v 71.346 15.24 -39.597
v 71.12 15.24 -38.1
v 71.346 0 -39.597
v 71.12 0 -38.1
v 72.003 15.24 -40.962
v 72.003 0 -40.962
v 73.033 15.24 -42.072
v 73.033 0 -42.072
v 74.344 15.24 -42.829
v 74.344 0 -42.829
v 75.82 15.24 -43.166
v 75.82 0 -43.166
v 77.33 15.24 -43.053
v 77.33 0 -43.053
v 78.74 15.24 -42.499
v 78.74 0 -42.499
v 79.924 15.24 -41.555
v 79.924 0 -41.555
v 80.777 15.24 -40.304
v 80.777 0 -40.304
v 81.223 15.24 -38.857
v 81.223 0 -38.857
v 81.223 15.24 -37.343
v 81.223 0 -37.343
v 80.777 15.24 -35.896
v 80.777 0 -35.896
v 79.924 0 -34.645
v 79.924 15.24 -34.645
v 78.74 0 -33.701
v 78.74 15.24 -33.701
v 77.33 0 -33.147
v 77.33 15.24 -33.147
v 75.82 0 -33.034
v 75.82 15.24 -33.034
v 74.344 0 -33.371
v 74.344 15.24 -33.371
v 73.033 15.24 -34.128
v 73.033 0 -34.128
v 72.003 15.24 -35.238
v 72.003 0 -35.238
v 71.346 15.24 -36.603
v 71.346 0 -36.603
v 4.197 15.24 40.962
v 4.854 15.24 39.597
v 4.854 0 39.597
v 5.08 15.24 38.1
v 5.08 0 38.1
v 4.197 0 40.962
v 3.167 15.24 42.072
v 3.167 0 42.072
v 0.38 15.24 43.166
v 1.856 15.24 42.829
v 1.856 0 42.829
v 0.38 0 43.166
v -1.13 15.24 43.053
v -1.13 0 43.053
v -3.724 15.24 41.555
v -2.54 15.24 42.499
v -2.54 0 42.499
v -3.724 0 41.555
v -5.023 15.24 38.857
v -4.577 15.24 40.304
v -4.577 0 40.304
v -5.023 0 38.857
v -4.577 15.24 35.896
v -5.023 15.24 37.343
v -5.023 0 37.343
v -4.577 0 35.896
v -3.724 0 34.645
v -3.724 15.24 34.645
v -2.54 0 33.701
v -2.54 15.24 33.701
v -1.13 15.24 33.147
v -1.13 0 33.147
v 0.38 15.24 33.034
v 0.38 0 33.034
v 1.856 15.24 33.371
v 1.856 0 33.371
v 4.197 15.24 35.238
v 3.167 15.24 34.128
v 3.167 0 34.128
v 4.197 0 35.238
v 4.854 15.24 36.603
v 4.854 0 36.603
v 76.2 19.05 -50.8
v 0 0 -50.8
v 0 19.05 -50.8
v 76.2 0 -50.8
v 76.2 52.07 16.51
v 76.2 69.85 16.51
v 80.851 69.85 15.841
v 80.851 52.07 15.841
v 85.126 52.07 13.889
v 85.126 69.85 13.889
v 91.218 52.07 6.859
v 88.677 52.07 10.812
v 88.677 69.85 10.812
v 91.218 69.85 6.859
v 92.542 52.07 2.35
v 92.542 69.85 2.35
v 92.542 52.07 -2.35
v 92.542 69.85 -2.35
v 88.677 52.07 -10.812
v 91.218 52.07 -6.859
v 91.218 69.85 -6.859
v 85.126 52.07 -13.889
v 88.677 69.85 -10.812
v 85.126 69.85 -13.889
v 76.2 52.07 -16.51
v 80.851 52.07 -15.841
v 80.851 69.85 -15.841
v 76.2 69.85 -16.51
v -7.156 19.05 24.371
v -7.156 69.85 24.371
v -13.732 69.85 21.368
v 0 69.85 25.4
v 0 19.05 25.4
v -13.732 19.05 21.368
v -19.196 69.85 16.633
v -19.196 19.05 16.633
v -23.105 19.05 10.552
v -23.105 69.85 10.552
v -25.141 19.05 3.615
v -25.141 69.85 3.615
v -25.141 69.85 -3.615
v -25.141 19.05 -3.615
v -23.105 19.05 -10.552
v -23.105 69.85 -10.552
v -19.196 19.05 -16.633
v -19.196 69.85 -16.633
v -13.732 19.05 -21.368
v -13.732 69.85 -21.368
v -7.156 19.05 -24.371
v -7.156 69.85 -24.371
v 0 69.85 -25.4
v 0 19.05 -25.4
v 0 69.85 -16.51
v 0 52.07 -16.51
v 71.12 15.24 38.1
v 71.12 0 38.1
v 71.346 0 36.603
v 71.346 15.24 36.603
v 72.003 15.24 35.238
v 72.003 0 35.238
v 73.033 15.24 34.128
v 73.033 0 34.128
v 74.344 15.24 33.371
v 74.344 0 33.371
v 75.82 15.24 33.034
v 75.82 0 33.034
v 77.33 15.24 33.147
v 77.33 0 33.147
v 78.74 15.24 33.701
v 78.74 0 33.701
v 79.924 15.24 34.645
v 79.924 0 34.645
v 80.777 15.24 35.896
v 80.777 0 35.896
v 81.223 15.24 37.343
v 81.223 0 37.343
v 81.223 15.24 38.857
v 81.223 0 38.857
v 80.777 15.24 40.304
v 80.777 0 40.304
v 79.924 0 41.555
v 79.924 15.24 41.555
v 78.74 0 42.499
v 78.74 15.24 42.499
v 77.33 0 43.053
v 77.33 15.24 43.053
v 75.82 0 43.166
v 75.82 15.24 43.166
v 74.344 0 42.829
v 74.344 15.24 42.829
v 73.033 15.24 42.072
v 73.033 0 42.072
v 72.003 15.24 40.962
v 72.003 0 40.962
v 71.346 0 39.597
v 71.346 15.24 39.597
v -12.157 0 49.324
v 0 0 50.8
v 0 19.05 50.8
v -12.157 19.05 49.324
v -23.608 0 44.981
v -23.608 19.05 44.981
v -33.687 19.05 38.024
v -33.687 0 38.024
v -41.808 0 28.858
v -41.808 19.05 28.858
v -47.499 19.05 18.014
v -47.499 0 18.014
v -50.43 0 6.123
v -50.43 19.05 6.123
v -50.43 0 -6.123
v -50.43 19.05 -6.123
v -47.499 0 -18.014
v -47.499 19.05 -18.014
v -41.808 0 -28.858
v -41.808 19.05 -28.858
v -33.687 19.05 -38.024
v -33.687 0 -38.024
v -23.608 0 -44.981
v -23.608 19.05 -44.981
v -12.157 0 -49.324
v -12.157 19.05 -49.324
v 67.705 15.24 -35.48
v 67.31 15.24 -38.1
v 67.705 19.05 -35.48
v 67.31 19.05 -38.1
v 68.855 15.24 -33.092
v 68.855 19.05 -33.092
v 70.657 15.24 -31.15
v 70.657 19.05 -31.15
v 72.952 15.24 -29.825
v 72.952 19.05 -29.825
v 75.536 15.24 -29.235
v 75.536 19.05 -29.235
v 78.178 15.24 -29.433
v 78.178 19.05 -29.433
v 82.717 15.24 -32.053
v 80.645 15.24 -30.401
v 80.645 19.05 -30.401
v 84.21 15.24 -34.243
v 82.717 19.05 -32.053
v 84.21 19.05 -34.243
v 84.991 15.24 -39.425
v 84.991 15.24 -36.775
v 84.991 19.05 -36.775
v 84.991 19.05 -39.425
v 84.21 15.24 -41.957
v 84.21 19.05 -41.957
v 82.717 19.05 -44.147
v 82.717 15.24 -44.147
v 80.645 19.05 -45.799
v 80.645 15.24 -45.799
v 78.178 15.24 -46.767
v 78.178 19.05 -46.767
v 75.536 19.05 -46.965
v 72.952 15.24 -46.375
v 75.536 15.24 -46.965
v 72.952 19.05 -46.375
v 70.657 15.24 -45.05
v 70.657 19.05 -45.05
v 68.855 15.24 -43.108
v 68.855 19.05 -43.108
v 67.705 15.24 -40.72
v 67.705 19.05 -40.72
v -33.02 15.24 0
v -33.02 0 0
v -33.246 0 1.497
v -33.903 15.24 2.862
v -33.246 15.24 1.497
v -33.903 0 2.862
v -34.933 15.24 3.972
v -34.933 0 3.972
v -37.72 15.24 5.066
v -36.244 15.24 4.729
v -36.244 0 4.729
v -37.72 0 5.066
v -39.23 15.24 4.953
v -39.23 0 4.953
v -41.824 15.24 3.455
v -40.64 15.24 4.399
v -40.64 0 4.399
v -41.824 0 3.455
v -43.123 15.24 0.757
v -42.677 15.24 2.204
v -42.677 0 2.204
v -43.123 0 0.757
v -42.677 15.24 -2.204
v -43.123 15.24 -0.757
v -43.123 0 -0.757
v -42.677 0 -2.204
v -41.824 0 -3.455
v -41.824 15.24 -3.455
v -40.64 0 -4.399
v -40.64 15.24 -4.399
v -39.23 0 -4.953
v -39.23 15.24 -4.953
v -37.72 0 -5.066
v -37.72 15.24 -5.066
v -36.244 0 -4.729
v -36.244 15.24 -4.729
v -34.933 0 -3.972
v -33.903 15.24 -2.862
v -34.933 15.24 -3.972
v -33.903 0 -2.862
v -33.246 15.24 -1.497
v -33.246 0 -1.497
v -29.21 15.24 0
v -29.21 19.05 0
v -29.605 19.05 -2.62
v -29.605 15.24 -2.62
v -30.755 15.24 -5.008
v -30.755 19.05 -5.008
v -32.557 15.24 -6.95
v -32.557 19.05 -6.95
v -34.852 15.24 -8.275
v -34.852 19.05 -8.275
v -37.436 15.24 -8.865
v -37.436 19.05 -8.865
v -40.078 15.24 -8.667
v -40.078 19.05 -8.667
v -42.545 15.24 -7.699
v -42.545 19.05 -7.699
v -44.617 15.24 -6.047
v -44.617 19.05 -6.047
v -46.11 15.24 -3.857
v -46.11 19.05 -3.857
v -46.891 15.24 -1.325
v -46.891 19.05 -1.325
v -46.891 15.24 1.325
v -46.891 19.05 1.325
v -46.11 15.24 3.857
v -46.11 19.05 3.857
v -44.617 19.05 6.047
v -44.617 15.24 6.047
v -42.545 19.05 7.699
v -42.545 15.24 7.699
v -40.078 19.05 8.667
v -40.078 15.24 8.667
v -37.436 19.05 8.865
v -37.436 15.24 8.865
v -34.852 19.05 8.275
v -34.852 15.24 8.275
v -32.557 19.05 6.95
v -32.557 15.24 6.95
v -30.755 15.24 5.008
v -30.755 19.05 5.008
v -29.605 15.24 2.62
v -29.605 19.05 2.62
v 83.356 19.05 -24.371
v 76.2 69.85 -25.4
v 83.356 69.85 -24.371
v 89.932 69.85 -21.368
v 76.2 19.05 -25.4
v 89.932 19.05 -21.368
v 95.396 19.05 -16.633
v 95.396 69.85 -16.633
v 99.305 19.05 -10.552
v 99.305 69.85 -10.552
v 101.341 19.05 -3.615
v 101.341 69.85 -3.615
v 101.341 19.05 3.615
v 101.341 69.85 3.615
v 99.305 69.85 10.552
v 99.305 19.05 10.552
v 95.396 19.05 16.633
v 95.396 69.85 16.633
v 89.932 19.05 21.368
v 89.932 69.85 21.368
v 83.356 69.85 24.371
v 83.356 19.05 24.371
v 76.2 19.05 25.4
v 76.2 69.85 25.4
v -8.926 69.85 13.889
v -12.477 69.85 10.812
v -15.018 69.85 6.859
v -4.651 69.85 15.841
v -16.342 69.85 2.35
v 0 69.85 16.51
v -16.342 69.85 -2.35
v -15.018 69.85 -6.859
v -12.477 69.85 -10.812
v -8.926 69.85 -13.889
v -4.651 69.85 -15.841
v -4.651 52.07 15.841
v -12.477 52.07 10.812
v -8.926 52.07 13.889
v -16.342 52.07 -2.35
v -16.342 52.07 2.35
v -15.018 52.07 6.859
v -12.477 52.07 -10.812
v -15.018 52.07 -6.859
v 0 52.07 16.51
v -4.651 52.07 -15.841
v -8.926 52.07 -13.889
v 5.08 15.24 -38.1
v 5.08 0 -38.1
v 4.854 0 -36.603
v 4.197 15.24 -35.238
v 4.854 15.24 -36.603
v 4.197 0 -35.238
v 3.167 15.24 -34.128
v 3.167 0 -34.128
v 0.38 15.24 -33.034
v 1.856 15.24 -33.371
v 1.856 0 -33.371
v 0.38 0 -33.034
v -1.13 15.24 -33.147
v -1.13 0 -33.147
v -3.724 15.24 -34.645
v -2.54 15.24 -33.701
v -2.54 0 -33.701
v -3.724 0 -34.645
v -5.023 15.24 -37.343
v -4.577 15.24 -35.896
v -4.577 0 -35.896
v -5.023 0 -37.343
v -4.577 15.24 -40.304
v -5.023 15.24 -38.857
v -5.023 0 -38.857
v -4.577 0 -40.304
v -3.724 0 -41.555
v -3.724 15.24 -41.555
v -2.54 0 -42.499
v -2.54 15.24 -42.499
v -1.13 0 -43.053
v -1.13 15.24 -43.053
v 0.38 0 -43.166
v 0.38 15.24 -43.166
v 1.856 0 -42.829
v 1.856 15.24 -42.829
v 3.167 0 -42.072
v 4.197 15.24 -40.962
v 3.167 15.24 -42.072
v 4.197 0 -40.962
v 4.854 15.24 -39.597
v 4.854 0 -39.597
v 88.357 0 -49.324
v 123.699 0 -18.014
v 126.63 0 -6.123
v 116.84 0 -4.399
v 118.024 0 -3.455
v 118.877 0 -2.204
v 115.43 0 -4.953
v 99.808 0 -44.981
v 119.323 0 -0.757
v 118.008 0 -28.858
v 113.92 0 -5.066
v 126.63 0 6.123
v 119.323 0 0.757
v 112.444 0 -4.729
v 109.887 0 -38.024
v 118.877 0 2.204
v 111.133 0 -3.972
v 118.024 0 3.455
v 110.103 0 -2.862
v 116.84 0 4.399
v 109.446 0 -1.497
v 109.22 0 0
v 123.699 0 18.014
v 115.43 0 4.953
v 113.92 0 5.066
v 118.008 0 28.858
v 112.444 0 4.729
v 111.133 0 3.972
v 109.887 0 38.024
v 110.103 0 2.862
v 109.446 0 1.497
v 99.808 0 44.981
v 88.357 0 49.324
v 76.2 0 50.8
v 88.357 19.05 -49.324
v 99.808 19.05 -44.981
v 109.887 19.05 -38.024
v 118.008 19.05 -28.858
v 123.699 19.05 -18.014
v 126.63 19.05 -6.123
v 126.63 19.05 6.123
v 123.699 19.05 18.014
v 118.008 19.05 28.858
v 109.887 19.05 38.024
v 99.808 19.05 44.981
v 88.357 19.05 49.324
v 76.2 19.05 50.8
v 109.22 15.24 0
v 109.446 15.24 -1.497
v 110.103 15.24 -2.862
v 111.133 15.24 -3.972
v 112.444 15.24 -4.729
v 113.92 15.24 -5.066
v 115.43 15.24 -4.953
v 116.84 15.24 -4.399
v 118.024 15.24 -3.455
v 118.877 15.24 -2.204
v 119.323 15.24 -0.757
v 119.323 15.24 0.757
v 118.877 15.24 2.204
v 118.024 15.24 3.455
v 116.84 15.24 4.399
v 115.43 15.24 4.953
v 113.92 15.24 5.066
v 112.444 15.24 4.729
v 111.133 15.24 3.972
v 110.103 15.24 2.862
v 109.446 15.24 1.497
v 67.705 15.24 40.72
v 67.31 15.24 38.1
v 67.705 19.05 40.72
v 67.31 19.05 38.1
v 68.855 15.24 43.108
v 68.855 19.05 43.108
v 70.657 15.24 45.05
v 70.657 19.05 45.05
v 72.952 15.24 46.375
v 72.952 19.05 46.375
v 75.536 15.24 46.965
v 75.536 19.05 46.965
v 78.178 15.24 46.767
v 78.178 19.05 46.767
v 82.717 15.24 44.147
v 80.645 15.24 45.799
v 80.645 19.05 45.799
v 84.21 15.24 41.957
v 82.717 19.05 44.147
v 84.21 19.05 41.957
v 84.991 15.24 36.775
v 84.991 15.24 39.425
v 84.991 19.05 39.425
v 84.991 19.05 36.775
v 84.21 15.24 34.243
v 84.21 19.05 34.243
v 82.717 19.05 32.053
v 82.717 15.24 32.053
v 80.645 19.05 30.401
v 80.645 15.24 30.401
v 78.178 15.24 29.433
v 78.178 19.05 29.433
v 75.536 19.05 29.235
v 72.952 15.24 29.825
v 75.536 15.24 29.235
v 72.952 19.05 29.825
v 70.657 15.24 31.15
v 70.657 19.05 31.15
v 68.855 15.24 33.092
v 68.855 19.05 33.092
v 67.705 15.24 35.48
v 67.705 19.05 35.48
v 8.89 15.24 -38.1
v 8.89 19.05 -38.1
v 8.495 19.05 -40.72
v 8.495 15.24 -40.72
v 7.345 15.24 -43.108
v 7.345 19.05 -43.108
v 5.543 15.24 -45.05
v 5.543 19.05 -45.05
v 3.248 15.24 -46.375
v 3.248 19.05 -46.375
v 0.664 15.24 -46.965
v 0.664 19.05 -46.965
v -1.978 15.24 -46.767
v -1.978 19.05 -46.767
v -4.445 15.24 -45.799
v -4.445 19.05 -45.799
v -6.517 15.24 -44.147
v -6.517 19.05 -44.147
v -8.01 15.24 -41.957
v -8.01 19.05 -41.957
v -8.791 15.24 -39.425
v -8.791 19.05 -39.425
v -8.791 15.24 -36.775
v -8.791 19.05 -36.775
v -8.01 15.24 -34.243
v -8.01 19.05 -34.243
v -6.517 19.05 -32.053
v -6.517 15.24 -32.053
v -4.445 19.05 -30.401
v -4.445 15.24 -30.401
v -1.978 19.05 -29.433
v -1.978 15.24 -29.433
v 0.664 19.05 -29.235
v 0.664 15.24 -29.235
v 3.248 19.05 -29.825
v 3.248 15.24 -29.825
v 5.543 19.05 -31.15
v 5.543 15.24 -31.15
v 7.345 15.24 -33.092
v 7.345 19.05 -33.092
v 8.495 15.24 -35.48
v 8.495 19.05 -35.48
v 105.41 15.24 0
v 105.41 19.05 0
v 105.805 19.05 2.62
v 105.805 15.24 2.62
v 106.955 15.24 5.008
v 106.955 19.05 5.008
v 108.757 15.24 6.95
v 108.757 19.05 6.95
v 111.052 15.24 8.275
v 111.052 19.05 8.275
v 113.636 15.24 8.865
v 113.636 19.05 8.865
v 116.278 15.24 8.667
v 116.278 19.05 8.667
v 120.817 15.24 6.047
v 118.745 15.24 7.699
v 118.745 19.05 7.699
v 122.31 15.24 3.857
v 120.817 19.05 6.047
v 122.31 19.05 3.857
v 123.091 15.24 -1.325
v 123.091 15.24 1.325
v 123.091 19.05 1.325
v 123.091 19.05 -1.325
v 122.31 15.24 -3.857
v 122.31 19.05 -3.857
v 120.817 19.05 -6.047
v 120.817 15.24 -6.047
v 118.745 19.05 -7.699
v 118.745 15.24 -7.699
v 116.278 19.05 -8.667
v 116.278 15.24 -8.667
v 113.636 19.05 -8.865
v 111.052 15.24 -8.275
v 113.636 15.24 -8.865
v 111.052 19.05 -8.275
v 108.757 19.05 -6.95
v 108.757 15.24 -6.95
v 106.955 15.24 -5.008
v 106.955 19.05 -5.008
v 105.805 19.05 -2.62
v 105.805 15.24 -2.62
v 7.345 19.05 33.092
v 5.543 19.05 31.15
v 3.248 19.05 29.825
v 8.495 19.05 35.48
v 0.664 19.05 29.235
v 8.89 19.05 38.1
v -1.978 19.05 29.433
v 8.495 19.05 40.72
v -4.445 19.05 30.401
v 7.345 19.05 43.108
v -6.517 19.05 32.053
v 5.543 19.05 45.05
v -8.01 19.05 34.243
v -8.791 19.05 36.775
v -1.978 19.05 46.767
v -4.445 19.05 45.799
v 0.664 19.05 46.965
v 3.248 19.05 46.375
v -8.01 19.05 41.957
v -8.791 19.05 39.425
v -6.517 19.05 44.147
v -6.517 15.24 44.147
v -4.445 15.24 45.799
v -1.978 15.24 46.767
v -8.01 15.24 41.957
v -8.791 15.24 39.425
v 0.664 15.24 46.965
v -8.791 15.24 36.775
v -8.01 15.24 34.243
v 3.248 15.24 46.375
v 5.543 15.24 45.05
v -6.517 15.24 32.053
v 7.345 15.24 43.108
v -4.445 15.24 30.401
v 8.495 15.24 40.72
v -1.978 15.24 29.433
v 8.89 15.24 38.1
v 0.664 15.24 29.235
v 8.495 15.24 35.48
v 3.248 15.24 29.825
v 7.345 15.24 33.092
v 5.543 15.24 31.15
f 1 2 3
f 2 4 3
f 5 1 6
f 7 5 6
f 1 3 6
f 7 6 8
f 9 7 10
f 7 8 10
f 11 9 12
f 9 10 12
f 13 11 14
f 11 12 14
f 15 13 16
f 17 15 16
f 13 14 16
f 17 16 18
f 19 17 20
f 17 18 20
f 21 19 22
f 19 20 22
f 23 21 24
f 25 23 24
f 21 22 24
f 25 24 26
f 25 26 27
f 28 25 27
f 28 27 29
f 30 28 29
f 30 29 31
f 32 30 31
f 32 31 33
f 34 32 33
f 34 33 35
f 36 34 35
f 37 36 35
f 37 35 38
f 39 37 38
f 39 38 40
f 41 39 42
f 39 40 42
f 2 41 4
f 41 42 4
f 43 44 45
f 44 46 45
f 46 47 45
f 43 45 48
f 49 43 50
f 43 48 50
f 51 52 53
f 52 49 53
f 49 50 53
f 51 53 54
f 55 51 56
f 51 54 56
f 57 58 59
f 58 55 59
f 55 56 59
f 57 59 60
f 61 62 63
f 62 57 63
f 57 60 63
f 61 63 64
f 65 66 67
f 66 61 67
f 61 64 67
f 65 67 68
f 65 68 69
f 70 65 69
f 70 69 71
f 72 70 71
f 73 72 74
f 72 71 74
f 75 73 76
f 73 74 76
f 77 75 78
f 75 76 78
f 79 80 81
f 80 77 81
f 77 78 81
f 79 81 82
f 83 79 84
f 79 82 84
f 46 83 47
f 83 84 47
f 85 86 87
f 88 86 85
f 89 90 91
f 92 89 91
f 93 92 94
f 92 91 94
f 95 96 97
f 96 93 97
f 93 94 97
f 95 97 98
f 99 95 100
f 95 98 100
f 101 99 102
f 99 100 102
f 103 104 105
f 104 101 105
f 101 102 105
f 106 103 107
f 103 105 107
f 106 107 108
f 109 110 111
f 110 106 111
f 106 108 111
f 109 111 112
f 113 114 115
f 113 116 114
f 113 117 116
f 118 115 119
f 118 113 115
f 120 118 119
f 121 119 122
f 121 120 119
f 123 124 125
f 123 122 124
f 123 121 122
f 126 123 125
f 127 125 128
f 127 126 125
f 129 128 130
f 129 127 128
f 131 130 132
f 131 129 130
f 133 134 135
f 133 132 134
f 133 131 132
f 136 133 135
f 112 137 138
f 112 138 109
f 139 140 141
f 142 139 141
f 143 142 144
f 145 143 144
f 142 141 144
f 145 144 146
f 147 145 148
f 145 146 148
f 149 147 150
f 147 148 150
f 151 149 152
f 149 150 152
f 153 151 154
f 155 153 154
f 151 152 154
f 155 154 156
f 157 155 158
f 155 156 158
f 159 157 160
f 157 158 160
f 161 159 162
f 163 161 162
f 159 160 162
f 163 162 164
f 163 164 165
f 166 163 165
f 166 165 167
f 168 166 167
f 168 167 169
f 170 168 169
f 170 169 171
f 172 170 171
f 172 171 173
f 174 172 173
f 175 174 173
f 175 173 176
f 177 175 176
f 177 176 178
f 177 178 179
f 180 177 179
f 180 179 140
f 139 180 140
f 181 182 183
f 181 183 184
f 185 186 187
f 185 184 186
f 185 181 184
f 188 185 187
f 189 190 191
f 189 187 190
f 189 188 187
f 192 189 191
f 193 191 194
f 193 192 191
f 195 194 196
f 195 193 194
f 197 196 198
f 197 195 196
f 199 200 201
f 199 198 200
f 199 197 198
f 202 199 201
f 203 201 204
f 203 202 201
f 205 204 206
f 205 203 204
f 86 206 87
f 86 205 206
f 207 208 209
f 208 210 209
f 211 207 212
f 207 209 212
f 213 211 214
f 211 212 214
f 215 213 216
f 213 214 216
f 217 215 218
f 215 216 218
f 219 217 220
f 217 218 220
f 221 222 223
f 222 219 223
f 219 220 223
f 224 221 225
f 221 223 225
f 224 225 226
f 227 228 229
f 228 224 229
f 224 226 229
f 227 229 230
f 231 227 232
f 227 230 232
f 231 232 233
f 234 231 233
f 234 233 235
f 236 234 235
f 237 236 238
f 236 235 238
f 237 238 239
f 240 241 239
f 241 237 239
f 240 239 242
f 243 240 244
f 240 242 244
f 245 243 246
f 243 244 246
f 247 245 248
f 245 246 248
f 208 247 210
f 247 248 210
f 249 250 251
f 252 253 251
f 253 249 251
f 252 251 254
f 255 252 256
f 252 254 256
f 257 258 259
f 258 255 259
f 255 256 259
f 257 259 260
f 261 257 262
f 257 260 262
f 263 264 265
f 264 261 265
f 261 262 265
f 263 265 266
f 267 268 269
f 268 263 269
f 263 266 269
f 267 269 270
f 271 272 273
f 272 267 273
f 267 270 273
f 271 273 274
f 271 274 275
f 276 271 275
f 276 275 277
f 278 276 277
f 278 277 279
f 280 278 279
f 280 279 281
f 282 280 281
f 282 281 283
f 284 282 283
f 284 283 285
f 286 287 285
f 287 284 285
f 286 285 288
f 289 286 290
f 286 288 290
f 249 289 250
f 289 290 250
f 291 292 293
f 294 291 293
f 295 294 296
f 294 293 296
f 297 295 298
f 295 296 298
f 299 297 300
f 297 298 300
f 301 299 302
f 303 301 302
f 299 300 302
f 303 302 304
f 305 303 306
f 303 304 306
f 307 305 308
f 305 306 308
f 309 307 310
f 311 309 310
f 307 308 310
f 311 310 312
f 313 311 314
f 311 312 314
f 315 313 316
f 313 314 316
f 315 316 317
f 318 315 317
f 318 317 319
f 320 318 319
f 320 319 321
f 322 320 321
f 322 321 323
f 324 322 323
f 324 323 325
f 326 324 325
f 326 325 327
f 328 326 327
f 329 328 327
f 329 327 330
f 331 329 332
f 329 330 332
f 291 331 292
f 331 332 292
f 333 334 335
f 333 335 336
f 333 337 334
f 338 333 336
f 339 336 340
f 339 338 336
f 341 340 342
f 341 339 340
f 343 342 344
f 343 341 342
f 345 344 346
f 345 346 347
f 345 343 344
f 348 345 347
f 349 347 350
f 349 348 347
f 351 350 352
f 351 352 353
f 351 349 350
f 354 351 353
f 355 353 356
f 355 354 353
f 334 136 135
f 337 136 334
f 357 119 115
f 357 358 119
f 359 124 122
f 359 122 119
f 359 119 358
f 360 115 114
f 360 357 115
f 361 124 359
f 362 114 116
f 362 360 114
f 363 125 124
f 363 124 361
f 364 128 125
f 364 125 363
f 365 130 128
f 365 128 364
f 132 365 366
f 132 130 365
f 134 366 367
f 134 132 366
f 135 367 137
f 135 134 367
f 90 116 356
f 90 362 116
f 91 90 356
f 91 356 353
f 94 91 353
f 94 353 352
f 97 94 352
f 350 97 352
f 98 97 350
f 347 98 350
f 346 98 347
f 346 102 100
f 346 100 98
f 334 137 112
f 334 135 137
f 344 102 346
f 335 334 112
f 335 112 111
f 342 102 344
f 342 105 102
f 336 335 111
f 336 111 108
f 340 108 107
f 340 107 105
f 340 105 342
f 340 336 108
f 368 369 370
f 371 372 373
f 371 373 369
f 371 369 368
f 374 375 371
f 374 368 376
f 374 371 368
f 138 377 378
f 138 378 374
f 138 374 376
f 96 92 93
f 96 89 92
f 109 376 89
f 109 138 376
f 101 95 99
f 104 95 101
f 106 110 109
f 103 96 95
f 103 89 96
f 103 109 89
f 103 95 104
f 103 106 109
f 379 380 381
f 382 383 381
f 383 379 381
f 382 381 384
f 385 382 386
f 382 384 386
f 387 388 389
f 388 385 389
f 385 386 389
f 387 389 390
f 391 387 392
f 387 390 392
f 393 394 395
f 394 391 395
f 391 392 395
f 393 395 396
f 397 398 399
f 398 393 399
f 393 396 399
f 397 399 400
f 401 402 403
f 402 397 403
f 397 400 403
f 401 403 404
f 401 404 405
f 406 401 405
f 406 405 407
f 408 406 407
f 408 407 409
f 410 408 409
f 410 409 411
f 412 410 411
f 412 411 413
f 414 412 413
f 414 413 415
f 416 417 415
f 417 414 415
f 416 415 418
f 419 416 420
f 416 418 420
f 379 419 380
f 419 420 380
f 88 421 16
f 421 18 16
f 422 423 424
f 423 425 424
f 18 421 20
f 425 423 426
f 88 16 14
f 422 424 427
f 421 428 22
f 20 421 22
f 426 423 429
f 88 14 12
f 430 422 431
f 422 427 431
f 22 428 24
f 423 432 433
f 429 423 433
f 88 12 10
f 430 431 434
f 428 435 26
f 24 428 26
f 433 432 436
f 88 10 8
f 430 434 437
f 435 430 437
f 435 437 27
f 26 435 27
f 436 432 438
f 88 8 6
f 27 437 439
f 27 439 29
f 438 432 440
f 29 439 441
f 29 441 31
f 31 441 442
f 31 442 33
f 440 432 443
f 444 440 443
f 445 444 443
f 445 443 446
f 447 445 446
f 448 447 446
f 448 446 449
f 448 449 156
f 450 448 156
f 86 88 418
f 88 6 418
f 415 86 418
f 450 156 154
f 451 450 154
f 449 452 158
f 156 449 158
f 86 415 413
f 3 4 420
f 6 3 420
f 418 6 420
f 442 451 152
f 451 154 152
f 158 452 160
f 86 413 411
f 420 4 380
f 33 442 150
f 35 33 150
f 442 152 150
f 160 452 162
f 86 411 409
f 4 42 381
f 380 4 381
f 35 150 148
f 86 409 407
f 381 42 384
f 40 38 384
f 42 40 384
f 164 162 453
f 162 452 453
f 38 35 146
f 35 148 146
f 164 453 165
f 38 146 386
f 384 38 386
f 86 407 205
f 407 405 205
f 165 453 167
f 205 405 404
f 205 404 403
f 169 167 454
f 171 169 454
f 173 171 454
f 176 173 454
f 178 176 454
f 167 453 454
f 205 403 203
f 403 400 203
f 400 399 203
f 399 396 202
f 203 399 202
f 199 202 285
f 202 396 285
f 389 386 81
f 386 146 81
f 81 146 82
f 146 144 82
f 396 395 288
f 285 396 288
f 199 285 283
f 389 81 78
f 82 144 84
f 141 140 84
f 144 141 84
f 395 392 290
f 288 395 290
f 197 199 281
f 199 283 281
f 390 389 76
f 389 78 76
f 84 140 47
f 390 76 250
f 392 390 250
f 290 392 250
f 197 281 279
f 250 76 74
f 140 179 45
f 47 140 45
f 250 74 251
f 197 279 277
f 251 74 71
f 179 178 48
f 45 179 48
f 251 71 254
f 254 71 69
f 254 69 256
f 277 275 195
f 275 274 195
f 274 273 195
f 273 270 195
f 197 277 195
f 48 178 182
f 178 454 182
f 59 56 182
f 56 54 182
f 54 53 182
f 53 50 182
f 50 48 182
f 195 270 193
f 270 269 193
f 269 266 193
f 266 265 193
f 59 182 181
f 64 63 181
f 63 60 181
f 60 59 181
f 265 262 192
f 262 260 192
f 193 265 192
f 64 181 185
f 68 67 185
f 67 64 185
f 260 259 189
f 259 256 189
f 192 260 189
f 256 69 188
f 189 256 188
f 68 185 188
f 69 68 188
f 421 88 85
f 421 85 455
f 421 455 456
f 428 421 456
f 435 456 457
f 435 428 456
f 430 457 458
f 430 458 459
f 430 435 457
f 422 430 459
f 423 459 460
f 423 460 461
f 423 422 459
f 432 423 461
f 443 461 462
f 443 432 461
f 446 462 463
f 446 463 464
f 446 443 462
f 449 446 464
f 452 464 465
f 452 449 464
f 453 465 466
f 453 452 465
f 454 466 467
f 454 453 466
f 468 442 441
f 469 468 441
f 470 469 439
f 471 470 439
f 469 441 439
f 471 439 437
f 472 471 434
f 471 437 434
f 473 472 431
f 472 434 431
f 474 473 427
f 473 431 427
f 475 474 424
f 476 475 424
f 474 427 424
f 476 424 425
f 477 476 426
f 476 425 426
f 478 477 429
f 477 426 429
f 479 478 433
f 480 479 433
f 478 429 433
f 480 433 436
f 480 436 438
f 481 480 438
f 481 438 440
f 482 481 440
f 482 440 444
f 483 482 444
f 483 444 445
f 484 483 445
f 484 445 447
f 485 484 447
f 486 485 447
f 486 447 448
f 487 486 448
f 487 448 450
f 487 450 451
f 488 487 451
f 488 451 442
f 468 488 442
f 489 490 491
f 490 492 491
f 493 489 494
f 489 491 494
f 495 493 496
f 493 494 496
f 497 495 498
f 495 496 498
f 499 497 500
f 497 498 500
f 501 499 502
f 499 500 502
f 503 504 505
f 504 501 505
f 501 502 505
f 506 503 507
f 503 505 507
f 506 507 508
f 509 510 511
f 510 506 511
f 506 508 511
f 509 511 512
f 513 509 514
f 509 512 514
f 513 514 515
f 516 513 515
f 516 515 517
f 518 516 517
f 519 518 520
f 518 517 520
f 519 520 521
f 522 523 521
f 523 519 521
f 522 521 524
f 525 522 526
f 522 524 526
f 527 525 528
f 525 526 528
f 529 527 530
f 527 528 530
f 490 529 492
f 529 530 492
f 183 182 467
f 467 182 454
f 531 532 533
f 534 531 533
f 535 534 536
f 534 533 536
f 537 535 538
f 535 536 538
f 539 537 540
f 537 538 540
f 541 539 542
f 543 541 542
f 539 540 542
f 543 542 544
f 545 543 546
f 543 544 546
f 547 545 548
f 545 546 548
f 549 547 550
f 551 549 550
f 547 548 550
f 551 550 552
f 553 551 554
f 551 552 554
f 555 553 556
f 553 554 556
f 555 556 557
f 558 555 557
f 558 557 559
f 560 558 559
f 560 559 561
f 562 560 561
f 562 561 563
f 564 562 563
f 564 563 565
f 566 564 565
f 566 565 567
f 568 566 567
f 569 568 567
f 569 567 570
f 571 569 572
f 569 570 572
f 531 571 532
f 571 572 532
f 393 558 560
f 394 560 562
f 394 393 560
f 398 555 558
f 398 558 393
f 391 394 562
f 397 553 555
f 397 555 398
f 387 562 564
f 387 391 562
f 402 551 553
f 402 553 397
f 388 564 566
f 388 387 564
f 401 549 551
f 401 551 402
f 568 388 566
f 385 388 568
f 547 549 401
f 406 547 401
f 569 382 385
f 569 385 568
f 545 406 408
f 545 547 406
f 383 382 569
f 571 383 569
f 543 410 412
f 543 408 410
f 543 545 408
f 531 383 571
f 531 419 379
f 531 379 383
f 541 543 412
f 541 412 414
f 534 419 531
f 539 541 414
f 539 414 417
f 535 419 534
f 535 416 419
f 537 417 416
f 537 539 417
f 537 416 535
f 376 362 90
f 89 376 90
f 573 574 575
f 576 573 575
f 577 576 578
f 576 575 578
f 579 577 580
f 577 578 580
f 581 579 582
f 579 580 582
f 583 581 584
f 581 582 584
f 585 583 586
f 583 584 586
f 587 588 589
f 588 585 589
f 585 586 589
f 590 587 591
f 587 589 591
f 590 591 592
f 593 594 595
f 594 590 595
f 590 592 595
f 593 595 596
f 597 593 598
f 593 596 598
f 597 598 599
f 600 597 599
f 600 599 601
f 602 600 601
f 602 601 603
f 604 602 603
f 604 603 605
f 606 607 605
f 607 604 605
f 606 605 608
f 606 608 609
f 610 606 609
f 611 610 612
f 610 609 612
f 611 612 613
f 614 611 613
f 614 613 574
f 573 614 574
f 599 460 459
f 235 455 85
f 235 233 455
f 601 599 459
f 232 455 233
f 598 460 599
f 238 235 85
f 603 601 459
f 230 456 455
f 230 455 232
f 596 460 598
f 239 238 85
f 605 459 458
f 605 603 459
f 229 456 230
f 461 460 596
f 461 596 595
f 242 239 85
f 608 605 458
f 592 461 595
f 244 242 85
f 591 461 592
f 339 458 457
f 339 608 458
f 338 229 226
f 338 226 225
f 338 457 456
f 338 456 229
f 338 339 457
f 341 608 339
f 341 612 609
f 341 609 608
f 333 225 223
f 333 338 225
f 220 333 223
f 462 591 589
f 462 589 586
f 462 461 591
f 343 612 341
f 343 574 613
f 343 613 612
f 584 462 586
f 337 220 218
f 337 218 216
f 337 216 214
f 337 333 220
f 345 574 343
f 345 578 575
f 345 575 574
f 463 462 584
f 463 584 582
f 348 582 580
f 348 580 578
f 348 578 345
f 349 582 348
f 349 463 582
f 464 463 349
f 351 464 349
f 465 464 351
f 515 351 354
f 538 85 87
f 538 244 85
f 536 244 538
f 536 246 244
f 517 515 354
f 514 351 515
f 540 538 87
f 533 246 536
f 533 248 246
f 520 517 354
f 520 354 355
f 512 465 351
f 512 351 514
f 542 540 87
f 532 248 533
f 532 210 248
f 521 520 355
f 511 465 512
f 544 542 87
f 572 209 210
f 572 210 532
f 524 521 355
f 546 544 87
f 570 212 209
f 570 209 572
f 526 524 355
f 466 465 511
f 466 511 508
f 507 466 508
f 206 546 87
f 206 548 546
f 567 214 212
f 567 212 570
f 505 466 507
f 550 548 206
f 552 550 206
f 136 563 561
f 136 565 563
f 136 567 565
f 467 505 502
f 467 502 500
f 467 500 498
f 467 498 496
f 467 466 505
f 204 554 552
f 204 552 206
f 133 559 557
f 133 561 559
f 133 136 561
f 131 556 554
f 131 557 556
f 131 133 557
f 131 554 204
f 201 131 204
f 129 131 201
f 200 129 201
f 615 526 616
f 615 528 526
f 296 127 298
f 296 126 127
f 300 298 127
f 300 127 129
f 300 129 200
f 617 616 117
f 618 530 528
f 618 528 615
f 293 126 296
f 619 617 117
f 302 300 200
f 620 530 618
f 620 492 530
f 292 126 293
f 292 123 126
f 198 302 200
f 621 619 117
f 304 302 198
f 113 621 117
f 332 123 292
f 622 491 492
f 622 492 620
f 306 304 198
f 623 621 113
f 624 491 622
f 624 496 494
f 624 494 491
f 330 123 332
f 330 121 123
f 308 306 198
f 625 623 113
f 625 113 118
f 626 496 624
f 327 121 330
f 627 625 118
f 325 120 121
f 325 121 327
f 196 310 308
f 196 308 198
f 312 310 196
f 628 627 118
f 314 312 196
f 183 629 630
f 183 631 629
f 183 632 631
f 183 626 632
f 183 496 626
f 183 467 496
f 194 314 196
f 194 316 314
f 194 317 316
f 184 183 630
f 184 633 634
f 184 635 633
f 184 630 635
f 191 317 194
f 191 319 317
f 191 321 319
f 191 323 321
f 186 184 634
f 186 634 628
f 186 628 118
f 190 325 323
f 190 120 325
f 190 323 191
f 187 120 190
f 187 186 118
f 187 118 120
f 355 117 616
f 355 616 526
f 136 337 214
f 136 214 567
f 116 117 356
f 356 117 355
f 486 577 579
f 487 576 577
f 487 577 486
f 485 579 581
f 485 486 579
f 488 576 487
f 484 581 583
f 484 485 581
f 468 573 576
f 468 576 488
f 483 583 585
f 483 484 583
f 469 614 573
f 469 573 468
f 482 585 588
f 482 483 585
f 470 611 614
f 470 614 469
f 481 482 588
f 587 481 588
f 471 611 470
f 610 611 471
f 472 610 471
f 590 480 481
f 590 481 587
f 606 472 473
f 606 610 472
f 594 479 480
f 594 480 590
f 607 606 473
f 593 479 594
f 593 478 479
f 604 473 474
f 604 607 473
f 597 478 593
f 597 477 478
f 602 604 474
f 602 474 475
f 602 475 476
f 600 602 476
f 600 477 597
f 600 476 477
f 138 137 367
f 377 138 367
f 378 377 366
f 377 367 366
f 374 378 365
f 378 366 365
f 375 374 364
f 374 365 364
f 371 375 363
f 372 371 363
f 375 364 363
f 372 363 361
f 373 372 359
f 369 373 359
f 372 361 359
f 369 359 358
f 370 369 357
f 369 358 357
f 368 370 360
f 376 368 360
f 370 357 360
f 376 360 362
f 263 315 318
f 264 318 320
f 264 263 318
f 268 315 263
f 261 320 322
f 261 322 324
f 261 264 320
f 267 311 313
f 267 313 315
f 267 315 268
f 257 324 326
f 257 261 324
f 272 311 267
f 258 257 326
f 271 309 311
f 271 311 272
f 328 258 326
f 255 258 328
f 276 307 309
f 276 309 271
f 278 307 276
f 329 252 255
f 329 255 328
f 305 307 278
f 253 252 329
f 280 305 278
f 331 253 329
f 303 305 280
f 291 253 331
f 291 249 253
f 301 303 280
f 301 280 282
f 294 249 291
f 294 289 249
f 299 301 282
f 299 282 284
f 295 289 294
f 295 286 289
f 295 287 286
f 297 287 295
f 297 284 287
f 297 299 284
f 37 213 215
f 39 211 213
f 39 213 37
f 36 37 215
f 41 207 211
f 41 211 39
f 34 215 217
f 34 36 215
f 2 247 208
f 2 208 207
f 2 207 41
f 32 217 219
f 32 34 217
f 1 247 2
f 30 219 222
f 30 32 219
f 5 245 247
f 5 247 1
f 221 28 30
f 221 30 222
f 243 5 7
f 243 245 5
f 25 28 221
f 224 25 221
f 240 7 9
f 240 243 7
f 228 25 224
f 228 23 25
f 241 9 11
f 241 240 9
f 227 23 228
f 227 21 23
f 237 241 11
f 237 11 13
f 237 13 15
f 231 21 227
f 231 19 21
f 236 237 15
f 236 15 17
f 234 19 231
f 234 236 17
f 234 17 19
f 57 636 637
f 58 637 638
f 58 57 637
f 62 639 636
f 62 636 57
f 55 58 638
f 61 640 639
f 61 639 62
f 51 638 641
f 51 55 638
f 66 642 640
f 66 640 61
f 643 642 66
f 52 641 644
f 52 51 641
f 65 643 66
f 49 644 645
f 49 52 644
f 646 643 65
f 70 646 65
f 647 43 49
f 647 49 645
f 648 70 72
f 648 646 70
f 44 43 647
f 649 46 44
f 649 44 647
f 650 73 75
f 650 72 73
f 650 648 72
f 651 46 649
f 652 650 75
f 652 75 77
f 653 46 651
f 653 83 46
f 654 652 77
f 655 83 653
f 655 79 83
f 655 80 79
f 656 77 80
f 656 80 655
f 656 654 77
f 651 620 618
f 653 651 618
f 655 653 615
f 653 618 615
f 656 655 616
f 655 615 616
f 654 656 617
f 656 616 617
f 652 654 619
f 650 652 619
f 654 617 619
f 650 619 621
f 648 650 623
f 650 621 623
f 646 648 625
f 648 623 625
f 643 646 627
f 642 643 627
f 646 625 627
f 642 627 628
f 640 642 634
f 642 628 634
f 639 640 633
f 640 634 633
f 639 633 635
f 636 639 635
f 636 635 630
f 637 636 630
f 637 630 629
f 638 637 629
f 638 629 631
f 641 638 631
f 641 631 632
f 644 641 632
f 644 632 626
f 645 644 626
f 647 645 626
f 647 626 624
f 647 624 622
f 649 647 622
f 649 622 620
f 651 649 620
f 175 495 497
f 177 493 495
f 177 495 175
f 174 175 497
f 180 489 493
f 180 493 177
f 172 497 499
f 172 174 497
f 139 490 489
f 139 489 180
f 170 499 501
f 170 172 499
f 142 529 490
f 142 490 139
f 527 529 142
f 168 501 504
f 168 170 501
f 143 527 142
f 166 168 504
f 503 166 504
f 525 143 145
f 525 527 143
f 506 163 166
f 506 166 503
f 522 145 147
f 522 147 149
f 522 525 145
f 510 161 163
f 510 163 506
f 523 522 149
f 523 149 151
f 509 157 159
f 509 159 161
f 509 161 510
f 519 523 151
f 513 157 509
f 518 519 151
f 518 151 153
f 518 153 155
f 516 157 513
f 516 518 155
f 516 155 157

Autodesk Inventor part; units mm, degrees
ref_plane "YZ Plane" through (0, 0, 0) normal (1, 0, 0) x (0, 1, 0)
ref_plane "XZ Plane" through (0, 0, 0) normal (0, 1, 0) x (-1, 0, 0)
ref_plane "XY Plane" through (0, 0, 0) normal (0, 0, 1) x (1, 0, 0)
sketch "Sketch5" plane through (0, 0, 0) normal (0, 1, 0) x (-1, 0, 0)
  arc A0 (0, -50.8) -> (0, 50.8) centre (0, 0) ccw
  line L0 (0, -50.8) -> (-38.1, -50.8)
  line L1 (0, 50.8) -> (-38.1, 50.8)
  line L2 (-38.1, 50.8) -> (-38.1, -50.8)
  dimension "d13" = 101.6
  dimension "d14" = 38.1
  dimension "d15" = 38.1
extrude "Extrusion2" add sketch "Sketch5" along normal blind 19.05
sketch "Sketch6" plane through (0, 19.05, 0) normal (0, 1, 0) x (1, 0, 0)
  arc A0 (0, 25.4) -> (0, -25.4) centre (0, 0) ccw
  line L0 (0, 25.4) -> (38.1, 25.4)
  line L1 (38.1, -50.8) -> (38.1, 50.8) projected
  line L2 (0, -25.4) -> (38.1, -25.4)
  line L3 (38.1, 25.4) -> (38.1, -25.4)
  dimension "d18" = 50.8
extrude "Extrusion3" add sketch "Sketch6" along normal blind 50.8
sketch "Sketch7" plane through (0, 69.85, 0) normal (0, 1, 0) x (1, 0, 0)
  arc A0 (0, 16.51) -> (0, -16.51) centre (0, 0) ccw
  line L0 (0, 16.51) -> (38.1, 16.51)
  line L1 (38.1, -25.4) -> (38.1, 25.4) projected
  line L2 (0, -16.51) -> (38.1, -16.51)
  dimension "d21" = 33.02
extrude "Extrusion4" cut sketch "Sketch7" against normal blind 17.78
sketch "Sketch9" plane through (0, 0, 0) normal (0, -1, 0) x (1, 0, 0)
  arc A0 (0, 38.1) -> (0, -38.1) centre (0, 0) ccw
  circle A1 centre (-38.1, 0) radius 5.08
  circle A2 centre (0, 38.1) radius 5.08
  circle A3 centre (0, -38.1) radius 5.08
  dimension "d24" = 76.2
  dimension "d25" = 10.16
  dimension "d27" = 10.16
  dimension "d28" = 10.16
extrude "Extrusion5" cut sketch "Sketch9" against normal blind 19.05
sketch "Sketch10" plane through (0, 19.05, 0) normal (0, 1, 0) x (1, 0, 0)
  circle A0 centre (0, -38.1) radius 5.08 projected
  circle A1 centre (0, -38.1) radius 8.89
  circle A2 centre (-38.1, 0) radius 5.08 projected
  circle A3 centre (0, 38.1) radius 5.08 projected
  circle A4 centre (-38.1, 0) radius 8.89
  circle A5 centre (0, 38.1) radius 8.89
  point P0 (0, 0)
  dimension "d31" = 17.78
  dimension "d35" = 17.78
extrude "Extrusion6" cut sketch "Sketch10" against normal blind 3.81
mirror "Mirror1" about plane through (38.1, 0, 50.8) normal (1, 0, 0)
properties part number "Problem14_36_JacobMorgan_030916_pd3" material "Steel, Mild"
